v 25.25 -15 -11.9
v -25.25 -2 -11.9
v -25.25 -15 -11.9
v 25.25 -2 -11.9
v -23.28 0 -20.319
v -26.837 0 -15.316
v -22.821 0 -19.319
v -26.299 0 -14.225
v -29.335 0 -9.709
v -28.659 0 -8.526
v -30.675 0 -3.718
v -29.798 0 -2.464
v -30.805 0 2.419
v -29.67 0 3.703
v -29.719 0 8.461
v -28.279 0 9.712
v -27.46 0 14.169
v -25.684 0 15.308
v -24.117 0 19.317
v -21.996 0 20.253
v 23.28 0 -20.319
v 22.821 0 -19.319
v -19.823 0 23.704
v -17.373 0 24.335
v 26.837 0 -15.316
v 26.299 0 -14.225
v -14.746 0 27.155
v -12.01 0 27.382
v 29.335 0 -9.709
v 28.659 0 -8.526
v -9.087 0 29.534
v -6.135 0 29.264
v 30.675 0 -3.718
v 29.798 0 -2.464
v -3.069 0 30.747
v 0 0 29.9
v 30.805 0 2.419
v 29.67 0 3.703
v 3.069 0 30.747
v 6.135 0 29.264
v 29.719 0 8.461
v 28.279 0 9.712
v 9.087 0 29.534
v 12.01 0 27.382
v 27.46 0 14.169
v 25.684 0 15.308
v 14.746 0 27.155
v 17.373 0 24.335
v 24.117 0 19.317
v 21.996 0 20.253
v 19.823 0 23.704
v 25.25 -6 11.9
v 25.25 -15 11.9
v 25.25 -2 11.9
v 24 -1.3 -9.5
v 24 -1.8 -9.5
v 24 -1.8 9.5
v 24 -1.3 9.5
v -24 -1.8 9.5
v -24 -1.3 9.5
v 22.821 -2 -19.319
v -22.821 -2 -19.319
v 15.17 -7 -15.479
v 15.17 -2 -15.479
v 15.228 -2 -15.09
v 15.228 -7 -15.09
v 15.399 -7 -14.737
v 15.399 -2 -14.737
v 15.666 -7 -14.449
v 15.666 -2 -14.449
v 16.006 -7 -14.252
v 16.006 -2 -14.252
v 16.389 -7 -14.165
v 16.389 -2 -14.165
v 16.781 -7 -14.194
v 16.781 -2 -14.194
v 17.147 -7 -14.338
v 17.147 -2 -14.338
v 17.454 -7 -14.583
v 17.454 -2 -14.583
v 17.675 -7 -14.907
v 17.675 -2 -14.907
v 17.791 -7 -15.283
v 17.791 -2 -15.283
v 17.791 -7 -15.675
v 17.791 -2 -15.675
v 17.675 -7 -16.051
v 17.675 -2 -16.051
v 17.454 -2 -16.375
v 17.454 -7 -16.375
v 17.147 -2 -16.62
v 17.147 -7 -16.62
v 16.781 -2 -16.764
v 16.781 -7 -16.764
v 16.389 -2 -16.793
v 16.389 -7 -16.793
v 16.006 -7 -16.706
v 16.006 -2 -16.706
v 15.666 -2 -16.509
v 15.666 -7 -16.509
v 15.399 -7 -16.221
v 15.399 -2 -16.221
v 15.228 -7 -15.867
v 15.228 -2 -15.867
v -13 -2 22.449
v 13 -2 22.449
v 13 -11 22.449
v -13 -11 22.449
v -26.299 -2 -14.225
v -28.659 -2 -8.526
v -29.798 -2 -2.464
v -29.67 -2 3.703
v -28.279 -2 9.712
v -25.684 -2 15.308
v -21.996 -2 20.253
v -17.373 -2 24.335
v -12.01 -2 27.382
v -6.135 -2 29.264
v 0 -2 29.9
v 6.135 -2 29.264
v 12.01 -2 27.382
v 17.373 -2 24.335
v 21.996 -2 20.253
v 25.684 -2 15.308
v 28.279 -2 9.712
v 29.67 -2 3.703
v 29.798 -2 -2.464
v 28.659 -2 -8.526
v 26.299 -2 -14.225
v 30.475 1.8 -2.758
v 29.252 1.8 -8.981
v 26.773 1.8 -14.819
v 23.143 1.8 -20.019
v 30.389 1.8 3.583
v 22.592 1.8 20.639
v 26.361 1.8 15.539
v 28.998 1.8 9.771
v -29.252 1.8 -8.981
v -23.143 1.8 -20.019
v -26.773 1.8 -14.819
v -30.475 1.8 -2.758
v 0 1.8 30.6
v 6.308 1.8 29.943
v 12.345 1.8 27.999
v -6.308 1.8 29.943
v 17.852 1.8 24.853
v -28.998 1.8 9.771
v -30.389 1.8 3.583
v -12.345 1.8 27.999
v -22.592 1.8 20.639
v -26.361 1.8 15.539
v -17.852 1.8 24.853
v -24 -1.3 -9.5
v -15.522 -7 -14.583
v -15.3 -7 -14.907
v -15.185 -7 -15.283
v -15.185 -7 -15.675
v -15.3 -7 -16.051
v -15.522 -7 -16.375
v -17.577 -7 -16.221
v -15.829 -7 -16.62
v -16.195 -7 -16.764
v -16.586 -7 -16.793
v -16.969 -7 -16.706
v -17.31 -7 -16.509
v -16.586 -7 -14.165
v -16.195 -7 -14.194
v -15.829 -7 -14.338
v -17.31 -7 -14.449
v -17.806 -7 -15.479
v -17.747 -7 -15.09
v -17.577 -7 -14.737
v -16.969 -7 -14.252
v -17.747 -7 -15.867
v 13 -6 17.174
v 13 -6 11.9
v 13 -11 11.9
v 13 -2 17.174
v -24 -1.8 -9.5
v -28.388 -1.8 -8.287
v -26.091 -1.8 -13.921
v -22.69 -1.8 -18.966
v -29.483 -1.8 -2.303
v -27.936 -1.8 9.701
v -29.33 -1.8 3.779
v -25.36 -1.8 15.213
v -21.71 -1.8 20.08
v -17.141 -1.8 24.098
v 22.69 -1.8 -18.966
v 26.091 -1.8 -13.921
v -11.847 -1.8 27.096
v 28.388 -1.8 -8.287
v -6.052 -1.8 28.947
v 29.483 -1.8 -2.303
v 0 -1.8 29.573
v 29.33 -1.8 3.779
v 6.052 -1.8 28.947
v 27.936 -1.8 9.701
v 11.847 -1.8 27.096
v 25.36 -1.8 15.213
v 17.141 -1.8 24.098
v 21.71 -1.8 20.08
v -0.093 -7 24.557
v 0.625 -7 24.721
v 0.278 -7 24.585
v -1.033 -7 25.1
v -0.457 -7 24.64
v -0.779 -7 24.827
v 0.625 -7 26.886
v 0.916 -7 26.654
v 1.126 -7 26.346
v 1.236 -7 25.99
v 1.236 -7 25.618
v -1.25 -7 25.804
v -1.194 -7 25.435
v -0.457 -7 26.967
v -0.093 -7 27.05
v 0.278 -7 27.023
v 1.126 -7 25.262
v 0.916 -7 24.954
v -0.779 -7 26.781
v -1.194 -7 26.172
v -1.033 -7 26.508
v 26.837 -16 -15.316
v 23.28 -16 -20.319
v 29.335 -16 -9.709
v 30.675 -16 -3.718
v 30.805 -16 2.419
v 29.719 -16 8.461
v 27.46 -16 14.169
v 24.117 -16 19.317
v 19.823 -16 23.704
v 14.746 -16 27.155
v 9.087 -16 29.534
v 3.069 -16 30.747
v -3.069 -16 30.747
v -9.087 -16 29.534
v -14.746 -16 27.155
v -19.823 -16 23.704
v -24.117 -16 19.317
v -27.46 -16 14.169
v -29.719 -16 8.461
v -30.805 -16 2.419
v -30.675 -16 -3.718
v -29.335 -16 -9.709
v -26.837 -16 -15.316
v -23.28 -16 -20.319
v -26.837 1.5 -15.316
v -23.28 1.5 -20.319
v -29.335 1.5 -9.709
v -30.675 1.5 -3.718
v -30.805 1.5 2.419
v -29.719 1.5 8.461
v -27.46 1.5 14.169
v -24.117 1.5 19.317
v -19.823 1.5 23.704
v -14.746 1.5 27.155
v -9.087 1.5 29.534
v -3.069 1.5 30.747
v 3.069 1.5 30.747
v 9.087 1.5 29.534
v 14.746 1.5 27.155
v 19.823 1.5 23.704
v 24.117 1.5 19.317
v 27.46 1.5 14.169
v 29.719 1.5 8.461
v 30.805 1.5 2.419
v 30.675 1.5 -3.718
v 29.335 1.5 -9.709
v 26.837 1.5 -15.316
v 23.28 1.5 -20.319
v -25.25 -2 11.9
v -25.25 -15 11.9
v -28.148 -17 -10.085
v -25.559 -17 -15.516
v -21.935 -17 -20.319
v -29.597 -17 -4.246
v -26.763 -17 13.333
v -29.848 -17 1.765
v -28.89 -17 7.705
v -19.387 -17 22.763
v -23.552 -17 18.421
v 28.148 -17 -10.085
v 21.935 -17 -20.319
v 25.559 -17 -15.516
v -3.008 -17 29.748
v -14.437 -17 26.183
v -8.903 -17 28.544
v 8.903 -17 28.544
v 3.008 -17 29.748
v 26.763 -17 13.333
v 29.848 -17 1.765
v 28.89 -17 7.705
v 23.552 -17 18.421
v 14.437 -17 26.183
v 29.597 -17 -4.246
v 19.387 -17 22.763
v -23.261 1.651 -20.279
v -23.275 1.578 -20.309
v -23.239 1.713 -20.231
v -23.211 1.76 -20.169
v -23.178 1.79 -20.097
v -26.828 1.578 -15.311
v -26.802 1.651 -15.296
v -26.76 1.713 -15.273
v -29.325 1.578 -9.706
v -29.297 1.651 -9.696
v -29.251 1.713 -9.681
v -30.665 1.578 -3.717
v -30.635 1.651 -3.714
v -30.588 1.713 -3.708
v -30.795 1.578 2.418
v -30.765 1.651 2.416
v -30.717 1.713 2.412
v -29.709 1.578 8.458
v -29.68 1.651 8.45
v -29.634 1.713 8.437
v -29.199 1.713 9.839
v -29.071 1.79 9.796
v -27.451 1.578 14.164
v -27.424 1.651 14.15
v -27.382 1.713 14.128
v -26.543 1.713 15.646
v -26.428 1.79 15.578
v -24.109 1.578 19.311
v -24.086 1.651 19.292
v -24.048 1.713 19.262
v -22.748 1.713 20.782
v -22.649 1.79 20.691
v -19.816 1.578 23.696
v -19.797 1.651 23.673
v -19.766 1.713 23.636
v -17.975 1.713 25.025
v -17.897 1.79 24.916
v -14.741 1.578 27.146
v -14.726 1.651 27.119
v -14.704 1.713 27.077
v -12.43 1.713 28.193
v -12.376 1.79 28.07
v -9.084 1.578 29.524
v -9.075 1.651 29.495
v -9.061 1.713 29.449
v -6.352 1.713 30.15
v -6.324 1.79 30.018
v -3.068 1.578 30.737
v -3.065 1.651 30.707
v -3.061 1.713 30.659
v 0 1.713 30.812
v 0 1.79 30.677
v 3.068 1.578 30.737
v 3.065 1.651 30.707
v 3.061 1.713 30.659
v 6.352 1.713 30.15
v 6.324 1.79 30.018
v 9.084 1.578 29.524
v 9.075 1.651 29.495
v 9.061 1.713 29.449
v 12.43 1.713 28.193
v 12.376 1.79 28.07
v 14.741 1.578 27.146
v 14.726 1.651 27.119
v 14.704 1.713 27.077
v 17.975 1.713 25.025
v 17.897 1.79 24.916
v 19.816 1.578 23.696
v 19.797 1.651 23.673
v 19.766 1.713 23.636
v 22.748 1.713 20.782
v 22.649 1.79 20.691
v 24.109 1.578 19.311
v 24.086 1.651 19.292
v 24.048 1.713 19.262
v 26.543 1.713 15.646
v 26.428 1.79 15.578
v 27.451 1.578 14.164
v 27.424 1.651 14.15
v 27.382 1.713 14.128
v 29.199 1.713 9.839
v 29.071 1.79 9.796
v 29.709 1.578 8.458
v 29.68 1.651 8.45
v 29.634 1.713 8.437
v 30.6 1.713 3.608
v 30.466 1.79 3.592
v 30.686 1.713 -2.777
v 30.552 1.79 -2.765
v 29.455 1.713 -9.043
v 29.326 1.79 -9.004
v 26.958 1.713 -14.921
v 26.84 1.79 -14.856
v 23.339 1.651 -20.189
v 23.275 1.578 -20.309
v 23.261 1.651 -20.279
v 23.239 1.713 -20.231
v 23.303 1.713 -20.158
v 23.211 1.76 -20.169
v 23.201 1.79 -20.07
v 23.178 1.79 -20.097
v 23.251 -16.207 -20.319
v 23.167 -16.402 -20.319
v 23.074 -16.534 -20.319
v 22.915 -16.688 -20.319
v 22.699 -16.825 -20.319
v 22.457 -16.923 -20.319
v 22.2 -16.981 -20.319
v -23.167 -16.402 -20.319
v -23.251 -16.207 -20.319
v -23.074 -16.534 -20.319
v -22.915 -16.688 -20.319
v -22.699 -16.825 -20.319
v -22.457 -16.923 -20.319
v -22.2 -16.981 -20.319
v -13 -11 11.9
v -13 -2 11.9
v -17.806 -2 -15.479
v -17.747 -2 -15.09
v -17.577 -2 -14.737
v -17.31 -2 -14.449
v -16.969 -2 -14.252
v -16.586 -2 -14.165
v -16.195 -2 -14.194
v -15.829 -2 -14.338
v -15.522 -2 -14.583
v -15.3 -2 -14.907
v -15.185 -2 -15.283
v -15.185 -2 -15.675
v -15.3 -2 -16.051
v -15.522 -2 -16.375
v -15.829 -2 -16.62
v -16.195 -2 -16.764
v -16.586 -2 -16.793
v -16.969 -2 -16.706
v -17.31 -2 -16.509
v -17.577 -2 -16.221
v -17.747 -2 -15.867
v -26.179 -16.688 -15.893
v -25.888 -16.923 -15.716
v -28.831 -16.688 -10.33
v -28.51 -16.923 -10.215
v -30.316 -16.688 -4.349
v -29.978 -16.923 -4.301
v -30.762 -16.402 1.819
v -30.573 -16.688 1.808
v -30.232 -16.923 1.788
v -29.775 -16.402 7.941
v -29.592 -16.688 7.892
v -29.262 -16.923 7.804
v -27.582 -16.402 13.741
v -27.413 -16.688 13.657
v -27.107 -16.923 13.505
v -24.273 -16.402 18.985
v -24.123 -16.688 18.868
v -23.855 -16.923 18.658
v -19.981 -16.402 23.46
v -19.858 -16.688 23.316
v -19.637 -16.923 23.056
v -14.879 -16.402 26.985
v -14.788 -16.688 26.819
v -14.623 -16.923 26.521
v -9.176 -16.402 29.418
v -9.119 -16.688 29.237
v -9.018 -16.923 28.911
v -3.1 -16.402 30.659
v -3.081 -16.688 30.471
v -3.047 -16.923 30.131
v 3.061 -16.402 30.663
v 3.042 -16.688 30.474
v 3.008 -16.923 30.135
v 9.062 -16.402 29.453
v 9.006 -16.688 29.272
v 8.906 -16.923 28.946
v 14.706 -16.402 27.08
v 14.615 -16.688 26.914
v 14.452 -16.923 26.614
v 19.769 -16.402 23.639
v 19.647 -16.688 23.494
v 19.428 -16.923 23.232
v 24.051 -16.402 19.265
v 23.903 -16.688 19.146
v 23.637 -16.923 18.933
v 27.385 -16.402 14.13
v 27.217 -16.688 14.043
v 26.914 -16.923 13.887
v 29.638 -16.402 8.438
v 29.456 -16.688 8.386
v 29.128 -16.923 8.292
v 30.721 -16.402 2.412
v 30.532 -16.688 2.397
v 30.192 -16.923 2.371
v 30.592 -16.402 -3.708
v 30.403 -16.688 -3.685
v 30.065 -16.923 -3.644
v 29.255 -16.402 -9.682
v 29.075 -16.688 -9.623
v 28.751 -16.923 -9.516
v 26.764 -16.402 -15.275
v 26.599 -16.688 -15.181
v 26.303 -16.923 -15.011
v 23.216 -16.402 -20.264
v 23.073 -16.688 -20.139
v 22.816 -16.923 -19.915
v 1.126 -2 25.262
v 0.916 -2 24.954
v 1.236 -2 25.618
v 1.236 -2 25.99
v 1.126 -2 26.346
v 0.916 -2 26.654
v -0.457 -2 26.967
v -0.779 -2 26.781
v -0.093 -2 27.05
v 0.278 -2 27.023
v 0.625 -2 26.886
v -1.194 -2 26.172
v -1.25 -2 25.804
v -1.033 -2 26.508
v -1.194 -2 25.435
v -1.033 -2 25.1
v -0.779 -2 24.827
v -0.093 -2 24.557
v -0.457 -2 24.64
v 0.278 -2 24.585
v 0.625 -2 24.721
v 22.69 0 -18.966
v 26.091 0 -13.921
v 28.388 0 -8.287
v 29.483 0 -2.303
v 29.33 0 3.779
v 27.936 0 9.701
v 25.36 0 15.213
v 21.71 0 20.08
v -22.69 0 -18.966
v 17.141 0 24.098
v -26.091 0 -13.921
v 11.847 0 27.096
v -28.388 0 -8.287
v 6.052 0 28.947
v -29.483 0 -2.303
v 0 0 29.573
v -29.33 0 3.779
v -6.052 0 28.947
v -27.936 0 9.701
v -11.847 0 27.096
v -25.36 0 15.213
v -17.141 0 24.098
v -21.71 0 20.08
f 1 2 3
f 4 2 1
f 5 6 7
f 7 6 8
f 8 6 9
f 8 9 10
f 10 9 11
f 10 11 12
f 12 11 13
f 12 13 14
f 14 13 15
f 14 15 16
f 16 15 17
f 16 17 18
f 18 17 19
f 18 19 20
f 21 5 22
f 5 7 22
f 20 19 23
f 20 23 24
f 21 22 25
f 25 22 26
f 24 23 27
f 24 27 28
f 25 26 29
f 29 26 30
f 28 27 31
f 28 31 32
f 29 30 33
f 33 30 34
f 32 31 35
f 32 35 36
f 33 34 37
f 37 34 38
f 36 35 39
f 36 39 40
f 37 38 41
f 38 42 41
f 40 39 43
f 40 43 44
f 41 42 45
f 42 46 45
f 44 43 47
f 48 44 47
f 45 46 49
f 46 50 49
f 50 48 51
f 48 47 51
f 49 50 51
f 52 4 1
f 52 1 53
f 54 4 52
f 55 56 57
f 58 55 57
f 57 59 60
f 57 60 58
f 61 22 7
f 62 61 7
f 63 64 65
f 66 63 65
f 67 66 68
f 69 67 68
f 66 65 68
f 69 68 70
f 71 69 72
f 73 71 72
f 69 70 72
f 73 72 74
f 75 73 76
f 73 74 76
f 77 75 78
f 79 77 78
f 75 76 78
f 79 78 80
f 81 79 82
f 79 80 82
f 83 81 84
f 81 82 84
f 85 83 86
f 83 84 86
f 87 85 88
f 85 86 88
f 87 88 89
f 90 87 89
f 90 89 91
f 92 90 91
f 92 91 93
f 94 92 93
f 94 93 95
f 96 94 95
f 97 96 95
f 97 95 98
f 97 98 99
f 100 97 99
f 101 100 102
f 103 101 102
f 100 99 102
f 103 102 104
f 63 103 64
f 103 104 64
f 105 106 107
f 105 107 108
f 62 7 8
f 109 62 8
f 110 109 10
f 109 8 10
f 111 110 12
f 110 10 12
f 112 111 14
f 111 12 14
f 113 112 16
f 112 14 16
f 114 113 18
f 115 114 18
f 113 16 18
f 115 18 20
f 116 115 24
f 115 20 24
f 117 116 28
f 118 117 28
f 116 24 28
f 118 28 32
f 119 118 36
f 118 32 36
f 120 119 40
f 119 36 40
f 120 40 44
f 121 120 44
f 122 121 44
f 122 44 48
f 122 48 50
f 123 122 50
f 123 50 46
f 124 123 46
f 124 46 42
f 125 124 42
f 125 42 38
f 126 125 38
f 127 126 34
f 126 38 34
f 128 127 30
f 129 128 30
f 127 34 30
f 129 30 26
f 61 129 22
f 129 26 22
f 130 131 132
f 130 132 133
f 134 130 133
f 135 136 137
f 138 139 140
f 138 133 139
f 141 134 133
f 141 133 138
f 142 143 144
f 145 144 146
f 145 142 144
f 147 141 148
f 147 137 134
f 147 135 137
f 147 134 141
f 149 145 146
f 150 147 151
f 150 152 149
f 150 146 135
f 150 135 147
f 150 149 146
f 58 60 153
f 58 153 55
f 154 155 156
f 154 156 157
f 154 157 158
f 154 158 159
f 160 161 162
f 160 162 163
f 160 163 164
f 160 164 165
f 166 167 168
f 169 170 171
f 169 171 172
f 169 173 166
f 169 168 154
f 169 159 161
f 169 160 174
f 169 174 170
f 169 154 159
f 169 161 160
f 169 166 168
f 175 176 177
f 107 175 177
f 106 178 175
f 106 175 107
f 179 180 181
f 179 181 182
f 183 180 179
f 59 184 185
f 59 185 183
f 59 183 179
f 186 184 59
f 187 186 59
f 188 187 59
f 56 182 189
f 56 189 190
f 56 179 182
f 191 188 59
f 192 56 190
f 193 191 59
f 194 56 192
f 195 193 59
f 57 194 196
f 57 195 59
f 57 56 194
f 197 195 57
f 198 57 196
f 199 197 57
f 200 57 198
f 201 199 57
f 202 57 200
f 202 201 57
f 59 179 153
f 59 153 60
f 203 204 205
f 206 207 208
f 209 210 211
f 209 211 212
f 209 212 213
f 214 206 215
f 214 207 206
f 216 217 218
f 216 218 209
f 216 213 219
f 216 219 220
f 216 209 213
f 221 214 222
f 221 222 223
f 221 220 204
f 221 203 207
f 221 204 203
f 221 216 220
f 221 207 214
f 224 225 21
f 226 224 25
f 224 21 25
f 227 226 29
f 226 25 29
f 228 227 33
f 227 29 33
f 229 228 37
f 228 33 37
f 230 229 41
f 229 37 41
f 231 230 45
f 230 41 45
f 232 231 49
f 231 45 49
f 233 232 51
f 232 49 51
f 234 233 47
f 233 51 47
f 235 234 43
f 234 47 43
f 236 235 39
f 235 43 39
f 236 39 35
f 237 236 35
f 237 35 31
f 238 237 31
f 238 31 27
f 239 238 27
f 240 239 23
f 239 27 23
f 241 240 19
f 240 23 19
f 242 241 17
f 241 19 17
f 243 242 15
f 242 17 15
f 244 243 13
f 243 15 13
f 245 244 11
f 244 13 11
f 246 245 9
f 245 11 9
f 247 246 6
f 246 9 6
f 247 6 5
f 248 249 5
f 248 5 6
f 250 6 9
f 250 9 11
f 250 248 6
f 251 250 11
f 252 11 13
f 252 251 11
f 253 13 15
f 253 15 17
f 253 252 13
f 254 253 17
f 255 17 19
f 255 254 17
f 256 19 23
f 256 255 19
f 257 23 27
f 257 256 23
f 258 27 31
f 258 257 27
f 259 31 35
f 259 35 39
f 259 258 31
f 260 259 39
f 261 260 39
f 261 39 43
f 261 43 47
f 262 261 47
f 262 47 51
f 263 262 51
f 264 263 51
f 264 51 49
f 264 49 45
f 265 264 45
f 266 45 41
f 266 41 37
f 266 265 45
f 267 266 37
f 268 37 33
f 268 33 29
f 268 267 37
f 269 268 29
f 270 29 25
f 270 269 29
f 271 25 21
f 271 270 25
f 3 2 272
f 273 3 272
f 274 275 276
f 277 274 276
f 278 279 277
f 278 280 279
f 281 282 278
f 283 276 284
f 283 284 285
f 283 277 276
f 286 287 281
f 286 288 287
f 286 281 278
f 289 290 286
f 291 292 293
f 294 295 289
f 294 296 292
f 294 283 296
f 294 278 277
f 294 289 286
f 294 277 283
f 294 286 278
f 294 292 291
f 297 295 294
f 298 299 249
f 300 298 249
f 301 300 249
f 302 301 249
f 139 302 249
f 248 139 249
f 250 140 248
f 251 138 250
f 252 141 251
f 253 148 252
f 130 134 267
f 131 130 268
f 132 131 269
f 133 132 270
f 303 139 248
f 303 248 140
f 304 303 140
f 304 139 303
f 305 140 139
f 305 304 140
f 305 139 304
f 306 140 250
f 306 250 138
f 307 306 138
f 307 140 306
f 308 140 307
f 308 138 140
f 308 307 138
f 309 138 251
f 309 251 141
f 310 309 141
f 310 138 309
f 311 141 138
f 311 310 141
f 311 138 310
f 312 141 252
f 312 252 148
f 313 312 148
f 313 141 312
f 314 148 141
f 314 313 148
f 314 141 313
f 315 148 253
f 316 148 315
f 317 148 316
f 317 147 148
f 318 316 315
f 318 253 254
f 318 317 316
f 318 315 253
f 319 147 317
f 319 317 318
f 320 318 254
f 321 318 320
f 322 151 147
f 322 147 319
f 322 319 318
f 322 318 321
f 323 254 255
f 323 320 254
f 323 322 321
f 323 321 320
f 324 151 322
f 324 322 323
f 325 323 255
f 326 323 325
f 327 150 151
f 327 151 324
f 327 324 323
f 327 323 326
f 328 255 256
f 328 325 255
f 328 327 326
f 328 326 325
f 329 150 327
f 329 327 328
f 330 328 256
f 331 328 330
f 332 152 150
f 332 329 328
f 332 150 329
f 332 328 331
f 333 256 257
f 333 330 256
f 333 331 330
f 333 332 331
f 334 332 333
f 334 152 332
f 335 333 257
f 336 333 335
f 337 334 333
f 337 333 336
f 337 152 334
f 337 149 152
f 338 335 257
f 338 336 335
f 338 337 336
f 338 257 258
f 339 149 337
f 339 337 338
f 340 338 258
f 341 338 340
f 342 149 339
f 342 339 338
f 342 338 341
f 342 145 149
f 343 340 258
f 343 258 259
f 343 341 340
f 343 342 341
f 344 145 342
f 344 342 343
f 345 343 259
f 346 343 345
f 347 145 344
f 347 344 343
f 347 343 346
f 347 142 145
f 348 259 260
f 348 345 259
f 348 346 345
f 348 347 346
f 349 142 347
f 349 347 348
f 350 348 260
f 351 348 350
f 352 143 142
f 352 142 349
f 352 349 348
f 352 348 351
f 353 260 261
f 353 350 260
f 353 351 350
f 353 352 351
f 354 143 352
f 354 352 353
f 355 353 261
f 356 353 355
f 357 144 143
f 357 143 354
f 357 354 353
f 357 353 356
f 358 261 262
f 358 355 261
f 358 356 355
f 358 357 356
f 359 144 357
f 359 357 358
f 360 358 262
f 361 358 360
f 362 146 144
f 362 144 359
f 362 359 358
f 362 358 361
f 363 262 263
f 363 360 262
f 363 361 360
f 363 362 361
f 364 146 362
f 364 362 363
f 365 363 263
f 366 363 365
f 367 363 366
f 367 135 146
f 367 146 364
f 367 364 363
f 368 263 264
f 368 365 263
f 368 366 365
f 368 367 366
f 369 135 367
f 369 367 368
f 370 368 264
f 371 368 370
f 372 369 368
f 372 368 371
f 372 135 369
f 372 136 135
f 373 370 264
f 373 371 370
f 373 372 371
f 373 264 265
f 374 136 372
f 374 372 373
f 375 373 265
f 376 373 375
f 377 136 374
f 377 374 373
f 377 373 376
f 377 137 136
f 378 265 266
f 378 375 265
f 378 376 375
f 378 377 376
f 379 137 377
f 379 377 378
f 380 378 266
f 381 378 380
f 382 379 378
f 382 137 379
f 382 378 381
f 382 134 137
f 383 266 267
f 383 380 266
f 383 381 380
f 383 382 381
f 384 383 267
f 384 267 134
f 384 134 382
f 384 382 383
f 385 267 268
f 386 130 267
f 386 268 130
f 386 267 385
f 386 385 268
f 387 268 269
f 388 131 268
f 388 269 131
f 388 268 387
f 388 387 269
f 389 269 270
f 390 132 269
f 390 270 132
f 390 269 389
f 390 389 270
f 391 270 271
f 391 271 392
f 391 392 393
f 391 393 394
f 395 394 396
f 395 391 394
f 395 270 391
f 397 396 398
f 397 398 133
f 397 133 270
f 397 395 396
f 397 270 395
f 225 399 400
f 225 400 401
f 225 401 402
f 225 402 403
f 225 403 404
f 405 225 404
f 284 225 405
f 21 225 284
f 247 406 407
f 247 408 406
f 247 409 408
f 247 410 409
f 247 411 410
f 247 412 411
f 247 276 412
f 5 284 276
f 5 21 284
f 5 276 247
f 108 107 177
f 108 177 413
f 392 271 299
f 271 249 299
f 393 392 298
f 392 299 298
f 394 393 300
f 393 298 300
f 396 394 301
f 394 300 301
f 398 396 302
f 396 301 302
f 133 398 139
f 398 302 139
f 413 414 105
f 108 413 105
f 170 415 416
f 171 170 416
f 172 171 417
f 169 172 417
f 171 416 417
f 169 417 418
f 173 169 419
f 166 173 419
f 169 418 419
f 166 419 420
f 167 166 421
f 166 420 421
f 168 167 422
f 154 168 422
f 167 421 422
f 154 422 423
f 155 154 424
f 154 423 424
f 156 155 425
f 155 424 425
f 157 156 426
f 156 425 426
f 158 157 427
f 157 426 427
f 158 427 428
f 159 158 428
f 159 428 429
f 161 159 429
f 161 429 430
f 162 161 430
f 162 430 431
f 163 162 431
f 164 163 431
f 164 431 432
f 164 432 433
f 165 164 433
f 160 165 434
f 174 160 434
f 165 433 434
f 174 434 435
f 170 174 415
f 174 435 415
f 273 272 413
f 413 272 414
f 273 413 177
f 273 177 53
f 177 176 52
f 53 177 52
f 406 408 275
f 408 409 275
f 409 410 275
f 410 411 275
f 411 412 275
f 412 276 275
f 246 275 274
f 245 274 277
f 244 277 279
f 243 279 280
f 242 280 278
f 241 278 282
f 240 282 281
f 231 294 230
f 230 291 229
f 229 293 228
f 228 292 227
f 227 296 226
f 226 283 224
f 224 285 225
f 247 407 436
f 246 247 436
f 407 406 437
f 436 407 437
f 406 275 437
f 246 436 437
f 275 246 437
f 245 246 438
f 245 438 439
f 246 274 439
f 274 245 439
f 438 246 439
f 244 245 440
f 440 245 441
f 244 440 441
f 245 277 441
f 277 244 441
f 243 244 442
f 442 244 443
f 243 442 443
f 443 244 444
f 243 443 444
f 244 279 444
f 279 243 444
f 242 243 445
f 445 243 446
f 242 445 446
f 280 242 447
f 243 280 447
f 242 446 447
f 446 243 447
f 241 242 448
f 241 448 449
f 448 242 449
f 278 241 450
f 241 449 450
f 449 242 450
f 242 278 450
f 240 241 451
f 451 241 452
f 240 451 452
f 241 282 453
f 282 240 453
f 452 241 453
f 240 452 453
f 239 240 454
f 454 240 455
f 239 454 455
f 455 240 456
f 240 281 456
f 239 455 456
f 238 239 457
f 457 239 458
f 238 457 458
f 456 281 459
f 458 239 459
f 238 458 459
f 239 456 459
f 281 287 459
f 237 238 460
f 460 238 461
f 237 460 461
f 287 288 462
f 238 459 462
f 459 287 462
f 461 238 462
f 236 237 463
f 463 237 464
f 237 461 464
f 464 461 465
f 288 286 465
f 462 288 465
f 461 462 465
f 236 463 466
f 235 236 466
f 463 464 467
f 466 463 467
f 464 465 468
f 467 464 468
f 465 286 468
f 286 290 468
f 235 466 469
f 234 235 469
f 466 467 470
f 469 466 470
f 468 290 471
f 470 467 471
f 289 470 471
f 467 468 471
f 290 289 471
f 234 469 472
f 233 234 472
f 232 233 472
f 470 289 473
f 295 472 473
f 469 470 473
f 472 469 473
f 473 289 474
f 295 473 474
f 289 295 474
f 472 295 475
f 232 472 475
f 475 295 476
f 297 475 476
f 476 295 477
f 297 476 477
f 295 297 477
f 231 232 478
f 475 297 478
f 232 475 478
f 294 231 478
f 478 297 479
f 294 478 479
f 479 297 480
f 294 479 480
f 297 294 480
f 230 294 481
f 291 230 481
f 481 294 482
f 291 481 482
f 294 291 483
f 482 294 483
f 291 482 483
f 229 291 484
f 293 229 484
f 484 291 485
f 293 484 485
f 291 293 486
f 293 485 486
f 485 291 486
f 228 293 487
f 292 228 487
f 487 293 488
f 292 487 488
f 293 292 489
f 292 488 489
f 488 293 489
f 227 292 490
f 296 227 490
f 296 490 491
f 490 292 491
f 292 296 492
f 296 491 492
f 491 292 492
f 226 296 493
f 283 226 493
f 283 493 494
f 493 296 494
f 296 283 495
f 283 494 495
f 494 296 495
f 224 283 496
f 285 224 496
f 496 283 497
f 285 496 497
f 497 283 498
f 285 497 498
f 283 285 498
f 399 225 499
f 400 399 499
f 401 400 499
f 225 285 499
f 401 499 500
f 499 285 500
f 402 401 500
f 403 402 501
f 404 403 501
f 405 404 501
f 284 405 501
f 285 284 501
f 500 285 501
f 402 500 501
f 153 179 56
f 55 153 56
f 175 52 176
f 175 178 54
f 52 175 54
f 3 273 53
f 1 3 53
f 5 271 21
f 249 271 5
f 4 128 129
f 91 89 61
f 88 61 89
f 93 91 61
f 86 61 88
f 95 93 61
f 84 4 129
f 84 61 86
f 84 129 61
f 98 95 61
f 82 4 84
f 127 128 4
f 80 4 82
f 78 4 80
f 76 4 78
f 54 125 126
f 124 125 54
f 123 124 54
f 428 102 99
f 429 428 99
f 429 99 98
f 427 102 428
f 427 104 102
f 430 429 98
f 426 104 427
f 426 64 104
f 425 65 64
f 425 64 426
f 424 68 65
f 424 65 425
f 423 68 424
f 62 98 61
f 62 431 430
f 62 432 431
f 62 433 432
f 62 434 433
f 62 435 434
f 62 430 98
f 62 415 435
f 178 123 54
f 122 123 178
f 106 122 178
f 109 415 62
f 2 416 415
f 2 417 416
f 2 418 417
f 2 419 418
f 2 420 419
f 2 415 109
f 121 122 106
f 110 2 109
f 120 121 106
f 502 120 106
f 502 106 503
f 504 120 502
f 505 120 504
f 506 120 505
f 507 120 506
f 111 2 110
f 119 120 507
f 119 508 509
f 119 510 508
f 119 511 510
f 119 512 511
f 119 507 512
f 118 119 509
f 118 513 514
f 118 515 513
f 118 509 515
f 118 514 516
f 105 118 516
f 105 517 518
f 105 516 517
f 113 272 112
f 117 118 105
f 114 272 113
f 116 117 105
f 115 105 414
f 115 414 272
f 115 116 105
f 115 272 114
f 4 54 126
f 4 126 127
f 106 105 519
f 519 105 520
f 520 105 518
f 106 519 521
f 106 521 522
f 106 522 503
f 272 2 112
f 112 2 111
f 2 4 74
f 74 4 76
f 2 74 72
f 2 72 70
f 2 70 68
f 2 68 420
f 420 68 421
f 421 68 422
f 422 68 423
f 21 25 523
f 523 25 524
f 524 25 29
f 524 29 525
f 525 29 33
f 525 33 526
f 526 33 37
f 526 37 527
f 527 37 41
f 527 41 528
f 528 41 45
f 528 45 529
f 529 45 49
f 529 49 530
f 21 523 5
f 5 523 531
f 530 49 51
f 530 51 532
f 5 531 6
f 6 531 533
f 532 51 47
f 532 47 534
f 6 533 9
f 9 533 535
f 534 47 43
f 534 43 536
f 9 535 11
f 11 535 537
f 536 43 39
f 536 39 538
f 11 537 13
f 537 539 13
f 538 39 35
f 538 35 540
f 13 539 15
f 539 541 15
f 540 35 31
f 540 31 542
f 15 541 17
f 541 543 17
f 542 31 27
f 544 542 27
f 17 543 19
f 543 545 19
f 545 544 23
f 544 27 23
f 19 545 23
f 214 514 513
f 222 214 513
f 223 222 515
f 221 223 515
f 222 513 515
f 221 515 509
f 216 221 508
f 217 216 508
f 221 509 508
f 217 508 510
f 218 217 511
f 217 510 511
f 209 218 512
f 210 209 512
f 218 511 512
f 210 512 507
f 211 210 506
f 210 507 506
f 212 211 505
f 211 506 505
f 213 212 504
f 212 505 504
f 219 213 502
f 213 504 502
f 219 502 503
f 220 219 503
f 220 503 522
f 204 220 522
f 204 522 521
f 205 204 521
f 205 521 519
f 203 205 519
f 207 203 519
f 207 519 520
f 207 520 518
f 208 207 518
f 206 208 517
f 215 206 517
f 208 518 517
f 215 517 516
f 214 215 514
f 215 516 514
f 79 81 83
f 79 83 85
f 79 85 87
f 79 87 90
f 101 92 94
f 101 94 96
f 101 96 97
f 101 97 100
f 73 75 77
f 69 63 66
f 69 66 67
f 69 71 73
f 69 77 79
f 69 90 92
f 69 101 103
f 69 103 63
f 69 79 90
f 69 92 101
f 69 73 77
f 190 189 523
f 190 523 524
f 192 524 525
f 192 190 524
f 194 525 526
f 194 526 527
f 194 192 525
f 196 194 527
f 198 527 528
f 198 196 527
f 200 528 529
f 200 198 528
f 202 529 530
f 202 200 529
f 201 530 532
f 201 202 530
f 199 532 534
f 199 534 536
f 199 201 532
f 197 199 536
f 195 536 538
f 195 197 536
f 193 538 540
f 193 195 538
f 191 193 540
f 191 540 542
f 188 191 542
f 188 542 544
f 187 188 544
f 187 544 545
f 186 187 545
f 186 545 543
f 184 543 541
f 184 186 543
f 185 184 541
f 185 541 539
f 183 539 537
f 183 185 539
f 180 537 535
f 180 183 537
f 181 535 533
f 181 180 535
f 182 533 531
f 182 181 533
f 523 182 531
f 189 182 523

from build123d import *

# Parameters (mm, degrees)
F0_R           = 30.9
F1_DEPTH       = 17
F2_W           = 50.5
F2_H           = 23.8
F3_DEPTH       = 15
F4_W           = 26
F4_H           = 11.5
F5_DEPTH       = 11
F7_DEPTH       = 6
F8_W           = 62.8076445868
F8_H           = 21.1615084887
F9_DEPTH       = 17.001
F11_DEPTH      = 2
F13_DEPTH      = 1.8
F13_DEPTH_BACK = 1.8
F15_DEPTH      = 1.8
F16_R          = 1
F17_R          = 1.3179542429
F17_R_2        = 1.25
F18_DEPTH      = 5
F19_W          = 48
F19_H          = 19
F20_DEPTH      = 0.5
F21_R          = 0.3


with BuildPart() as f1:
    # F0 (on Front) → F1 (new body)
    with BuildSketch(Plane.XZ):
        Circle(F0_R)
    extrude(amount=F1_DEPTH)

    # F2 (on Front) → F3 (cut)
    with BuildSketch(Plane.XZ):
        Rectangle(F2_W, F2_H)
    extrude(amount=F3_DEPTH, mode=Mode.SUBTRACT)

    # F4 (on face) → F5 (cut)
    with BuildSketch(Plane(origin=(0, 0, 0), x_dir=(-1, 0, 0), z_dir=(0, 1, 0))):
        with Locations((0, 16.6985985124)):
            Rectangle(F4_W, F4_H)
    extrude(amount=-F5_DEPTH, mode=Mode.SUBTRACT)

    # F6 (on face) → F7 (cut)
    with BuildSketch(Plane(origin=(0, 0, 0), x_dir=(-1, 0, 0), z_dir=(0, 1, 0))):
        Polygon((-13, 17.1742992562), (-25.25, 11.9), (-13, 11.9), align=None)
    extrude(amount=-F7_DEPTH, mode=Mode.SUBTRACT)

    # F8 (on face) → F9 (cut, through all)
    with BuildSketch(Plane(origin=(0, 0, 0), x_dir=(-1, 0, 0), z_dir=(0, 1, 0))):
        with Locations((0, -30.9)):
            Rectangle(F8_W, F8_H)
    extrude(amount=-F9_DEPTH, mode=Mode.SUBTRACT)

    # F10 (on face) → F11 (cut)
    with BuildSketch(Plane(origin=(0, 0, 0), x_dir=(-1, 0, 0), z_dir=(0, 1, 0))):
        with BuildLine():
            Line((-22.8205333731, -19.3192457557), (22.8205333731, -19.3192457557))
            ThreePointArc((22.8205333731, -19.3192457557), (0, 29.9), (-22.8205333731, -19.3192457557))
        make_face()
    extrude(amount=-F11_DEPTH, mode=Mode.SUBTRACT)

    # F16
    f16_edges = [f1.edges().sort_by_distance(p)[0] for p in [
        (0, -17, 30.9),
    ]]
    fillet(f16_edges, radius=F16_R)

    # F17 (on face) → F18 (cut)
    with BuildSketch(Plane(origin=(0, -2, 0), x_dir=(-1, 0, 0), z_dir=(0, 1, 0))):
        with Locations((-16.4878424257, -15.4789434746)):
            Circle(F17_R)
        with Locations((0, 25.803886354)):
            Circle(F17_R_2)
        with Locations((16.4878424257, -15.4789434746)):
            Circle(F17_R)
    extrude(amount=-F18_DEPTH, mode=Mode.SUBTRACT)


with BuildPart() as f13:
    # F12 (on Front) → F13 (new body, two sides)
    with BuildSketch(Plane.XZ) as f13_sk:
        with BuildLine():
            Line((-22.6899430128, -18.9658286482), (22.6899430128, -18.9658286482))
            ThreePointArc((22.6899430128, -18.9658286482), (0, 29.5725577223), (-22.6899430128, -18.9658286482))
        make_face()
    extrude(amount=F13_DEPTH)
    extrude(f13_sk.sketch, amount=-F13_DEPTH_BACK)

    # F14 (on face) → F15 (join)
    with BuildSketch(Plane(origin=(0, 1.8, 0), x_dir=(-1, 0, 0), z_dir=(0, 1, 0))):
        with BuildLine():
            ThreePointArc((23.2795672623, -20.3192457557), (0, 30.9), (-23.2795672623, -20.3192457557))
            Line((-23.2795672623, -20.3192457557), (23.2795672623, -20.3192457557))
        make_face()
    extrude(amount=-F15_DEPTH)

    # F19 (on face) → F20 (cut)
    with BuildSketch(Plane.XZ.offset(1.8)):
        Rectangle(F19_W, F19_H)
    extrude(amount=-F20_DEPTH, mode=Mode.SUBTRACT)

    # F21
    f21_edges = [f13.edges().sort_by_distance(p)[0] for p in [
        (0, 1.8, 30.9),
        (0, 1.8, -20.319246),
    ]]
    fillet(f21_edges, radius=F21_R)


solid = Compound([f1.part, f13.part])
